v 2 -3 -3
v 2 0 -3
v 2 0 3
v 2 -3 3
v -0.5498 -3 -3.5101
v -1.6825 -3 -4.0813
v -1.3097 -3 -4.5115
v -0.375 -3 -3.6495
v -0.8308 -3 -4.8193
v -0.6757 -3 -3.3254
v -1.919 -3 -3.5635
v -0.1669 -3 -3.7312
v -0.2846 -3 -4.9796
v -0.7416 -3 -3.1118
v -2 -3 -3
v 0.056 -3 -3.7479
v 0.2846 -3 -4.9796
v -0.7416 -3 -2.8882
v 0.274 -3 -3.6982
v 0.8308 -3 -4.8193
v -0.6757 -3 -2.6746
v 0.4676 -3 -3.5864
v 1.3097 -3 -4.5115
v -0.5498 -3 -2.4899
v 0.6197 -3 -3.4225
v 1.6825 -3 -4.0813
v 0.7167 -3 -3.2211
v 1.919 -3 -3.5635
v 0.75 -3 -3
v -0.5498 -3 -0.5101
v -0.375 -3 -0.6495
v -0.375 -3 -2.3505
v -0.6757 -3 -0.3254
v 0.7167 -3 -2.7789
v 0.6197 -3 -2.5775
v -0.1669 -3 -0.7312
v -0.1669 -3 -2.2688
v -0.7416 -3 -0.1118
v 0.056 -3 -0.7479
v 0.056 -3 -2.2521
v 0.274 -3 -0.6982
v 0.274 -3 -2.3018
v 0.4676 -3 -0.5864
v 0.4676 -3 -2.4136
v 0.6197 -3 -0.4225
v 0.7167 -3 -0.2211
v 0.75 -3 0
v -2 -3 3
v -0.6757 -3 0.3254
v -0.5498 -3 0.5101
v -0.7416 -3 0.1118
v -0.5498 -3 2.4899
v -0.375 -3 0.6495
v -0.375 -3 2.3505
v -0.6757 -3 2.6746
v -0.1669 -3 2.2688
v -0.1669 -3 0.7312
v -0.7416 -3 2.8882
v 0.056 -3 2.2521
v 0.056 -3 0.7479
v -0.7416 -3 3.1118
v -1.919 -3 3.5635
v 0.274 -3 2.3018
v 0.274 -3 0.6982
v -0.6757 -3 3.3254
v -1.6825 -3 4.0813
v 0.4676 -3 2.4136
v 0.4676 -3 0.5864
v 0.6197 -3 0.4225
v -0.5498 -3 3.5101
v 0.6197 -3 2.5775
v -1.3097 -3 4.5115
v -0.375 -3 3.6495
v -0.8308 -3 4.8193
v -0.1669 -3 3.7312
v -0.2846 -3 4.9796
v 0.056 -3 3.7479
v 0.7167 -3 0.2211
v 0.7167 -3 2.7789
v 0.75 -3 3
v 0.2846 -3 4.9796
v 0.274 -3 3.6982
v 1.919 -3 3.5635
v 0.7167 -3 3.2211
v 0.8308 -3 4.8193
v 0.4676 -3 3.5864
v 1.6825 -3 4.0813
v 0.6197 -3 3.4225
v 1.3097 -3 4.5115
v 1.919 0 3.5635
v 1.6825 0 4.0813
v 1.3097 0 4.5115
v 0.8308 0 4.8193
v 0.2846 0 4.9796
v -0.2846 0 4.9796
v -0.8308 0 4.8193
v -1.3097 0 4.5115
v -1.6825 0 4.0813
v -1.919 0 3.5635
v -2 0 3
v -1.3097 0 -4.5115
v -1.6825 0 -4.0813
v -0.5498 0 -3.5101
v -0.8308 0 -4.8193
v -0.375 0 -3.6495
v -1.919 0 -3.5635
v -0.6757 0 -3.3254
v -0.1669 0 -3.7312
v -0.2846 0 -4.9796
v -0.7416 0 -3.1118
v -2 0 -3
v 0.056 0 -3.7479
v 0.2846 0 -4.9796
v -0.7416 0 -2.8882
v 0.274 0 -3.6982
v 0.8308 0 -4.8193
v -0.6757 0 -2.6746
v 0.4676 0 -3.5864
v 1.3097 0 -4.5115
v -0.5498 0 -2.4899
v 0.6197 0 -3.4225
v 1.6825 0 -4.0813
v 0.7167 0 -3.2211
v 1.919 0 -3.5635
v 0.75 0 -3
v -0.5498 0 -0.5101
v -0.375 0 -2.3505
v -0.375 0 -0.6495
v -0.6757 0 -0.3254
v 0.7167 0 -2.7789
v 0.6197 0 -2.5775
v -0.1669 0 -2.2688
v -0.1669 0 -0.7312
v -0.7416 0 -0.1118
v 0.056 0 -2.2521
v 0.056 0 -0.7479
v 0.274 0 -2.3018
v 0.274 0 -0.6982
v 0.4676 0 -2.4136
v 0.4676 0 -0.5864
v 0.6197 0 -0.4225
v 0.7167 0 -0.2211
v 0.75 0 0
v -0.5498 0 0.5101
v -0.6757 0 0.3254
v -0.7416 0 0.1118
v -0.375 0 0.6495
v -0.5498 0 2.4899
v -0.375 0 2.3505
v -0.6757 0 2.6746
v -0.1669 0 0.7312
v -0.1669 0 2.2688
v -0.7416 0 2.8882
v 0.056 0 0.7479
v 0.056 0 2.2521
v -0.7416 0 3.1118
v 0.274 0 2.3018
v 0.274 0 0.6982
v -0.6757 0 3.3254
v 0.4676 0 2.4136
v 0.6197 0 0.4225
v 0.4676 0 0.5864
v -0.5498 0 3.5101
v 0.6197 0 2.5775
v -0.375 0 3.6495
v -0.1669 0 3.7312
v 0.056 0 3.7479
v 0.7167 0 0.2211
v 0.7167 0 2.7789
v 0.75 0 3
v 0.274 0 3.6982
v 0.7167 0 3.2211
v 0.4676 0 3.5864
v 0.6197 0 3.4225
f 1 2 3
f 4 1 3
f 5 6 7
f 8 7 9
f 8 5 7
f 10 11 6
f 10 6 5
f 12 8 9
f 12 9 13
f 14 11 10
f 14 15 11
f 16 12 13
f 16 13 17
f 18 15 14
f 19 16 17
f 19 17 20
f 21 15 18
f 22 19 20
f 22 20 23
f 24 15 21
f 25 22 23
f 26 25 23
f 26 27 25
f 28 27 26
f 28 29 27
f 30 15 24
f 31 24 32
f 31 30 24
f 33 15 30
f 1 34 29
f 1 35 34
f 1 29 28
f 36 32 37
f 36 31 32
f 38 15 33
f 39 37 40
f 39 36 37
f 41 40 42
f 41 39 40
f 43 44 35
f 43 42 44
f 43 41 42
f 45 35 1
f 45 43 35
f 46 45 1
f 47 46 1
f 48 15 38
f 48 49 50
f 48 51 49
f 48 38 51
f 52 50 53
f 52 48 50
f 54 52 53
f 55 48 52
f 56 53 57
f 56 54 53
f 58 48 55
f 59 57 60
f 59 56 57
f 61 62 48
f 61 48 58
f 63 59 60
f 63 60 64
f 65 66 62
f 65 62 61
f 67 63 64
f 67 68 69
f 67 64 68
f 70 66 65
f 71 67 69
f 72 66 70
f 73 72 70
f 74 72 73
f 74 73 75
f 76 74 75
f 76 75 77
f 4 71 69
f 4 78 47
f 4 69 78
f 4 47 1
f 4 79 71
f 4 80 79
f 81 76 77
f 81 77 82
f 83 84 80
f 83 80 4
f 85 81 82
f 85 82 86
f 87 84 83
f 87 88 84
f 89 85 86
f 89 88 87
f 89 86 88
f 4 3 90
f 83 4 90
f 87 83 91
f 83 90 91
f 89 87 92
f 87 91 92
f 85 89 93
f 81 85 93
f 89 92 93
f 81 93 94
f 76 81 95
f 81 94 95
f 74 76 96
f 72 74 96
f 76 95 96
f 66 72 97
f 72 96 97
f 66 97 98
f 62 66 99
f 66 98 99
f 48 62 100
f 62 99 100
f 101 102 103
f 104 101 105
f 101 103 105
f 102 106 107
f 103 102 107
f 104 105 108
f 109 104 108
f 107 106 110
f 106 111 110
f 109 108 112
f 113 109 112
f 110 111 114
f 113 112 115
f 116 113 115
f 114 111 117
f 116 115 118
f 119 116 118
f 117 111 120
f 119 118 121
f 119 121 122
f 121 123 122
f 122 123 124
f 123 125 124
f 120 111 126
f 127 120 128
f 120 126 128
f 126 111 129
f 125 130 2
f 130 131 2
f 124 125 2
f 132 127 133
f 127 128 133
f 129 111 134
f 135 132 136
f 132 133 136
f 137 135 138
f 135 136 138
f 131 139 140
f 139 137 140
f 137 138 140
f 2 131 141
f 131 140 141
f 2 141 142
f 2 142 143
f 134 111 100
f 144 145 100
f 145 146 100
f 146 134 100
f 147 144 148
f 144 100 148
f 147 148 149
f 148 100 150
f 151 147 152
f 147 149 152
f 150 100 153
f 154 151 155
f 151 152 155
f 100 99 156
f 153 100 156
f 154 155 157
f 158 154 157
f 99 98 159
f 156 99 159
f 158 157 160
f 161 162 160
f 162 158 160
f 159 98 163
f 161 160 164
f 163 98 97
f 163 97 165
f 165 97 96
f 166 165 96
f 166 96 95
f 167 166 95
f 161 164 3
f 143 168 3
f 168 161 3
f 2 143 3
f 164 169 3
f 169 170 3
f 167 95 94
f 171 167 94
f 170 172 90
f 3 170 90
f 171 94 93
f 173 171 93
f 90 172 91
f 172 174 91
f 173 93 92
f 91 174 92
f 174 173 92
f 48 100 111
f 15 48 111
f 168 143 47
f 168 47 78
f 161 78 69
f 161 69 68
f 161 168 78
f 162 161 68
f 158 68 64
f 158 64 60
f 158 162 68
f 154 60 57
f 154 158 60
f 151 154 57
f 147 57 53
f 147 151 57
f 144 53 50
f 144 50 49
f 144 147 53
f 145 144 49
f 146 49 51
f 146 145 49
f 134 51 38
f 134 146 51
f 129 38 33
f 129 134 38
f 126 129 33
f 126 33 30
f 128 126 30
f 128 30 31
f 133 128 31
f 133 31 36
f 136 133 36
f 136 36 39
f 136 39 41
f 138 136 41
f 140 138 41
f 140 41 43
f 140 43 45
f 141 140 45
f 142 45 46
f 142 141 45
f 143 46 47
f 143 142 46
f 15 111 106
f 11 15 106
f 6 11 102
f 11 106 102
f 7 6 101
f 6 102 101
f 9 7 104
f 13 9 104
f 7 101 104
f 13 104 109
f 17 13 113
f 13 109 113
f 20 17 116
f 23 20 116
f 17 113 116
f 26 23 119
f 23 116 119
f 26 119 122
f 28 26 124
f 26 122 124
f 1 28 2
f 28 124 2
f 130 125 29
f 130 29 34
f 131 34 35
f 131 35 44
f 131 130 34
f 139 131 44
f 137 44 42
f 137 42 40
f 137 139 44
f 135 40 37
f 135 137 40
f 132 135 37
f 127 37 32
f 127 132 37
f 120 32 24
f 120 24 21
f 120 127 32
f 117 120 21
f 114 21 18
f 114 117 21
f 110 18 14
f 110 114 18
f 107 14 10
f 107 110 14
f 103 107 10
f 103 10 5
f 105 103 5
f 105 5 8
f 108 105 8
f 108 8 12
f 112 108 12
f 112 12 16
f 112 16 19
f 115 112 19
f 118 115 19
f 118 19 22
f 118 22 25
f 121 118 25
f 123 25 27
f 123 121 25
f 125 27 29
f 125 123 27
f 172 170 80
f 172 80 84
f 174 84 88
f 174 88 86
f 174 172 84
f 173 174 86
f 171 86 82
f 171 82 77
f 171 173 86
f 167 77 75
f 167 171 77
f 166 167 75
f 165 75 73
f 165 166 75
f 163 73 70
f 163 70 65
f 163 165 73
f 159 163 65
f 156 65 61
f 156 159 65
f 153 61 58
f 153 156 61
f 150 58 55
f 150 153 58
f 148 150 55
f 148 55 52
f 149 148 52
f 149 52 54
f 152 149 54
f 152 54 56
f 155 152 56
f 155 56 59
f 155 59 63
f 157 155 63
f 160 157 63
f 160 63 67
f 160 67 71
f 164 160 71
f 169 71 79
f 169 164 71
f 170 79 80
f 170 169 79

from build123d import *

# Parameters (mm, degrees)
F0_R     = 0.75
F1_DEPTH = 3


with BuildPart() as f1:
    # F0 (on Front) → F1 (new body)
    with BuildSketch(Plane.XZ):
        with BuildLine():
            ThreePointArc((2, 3), (0, 5), (-2, 3))
            Line((-2, 3), (-2, -3))
            ThreePointArc((-2, -3), (0, -5), (2, -3))
            Line((2, -3), (2, 3))
        make_face()
        with Locations((0, -3)):
            Circle(F0_R, mode=Mode.SUBTRACT)
        Circle(F0_R, mode=Mode.SUBTRACT)
        with Locations((0, 3)):
            Circle(F0_R, mode=Mode.SUBTRACT)
    extrude(amount=F1_DEPTH)


solid = f1.part
